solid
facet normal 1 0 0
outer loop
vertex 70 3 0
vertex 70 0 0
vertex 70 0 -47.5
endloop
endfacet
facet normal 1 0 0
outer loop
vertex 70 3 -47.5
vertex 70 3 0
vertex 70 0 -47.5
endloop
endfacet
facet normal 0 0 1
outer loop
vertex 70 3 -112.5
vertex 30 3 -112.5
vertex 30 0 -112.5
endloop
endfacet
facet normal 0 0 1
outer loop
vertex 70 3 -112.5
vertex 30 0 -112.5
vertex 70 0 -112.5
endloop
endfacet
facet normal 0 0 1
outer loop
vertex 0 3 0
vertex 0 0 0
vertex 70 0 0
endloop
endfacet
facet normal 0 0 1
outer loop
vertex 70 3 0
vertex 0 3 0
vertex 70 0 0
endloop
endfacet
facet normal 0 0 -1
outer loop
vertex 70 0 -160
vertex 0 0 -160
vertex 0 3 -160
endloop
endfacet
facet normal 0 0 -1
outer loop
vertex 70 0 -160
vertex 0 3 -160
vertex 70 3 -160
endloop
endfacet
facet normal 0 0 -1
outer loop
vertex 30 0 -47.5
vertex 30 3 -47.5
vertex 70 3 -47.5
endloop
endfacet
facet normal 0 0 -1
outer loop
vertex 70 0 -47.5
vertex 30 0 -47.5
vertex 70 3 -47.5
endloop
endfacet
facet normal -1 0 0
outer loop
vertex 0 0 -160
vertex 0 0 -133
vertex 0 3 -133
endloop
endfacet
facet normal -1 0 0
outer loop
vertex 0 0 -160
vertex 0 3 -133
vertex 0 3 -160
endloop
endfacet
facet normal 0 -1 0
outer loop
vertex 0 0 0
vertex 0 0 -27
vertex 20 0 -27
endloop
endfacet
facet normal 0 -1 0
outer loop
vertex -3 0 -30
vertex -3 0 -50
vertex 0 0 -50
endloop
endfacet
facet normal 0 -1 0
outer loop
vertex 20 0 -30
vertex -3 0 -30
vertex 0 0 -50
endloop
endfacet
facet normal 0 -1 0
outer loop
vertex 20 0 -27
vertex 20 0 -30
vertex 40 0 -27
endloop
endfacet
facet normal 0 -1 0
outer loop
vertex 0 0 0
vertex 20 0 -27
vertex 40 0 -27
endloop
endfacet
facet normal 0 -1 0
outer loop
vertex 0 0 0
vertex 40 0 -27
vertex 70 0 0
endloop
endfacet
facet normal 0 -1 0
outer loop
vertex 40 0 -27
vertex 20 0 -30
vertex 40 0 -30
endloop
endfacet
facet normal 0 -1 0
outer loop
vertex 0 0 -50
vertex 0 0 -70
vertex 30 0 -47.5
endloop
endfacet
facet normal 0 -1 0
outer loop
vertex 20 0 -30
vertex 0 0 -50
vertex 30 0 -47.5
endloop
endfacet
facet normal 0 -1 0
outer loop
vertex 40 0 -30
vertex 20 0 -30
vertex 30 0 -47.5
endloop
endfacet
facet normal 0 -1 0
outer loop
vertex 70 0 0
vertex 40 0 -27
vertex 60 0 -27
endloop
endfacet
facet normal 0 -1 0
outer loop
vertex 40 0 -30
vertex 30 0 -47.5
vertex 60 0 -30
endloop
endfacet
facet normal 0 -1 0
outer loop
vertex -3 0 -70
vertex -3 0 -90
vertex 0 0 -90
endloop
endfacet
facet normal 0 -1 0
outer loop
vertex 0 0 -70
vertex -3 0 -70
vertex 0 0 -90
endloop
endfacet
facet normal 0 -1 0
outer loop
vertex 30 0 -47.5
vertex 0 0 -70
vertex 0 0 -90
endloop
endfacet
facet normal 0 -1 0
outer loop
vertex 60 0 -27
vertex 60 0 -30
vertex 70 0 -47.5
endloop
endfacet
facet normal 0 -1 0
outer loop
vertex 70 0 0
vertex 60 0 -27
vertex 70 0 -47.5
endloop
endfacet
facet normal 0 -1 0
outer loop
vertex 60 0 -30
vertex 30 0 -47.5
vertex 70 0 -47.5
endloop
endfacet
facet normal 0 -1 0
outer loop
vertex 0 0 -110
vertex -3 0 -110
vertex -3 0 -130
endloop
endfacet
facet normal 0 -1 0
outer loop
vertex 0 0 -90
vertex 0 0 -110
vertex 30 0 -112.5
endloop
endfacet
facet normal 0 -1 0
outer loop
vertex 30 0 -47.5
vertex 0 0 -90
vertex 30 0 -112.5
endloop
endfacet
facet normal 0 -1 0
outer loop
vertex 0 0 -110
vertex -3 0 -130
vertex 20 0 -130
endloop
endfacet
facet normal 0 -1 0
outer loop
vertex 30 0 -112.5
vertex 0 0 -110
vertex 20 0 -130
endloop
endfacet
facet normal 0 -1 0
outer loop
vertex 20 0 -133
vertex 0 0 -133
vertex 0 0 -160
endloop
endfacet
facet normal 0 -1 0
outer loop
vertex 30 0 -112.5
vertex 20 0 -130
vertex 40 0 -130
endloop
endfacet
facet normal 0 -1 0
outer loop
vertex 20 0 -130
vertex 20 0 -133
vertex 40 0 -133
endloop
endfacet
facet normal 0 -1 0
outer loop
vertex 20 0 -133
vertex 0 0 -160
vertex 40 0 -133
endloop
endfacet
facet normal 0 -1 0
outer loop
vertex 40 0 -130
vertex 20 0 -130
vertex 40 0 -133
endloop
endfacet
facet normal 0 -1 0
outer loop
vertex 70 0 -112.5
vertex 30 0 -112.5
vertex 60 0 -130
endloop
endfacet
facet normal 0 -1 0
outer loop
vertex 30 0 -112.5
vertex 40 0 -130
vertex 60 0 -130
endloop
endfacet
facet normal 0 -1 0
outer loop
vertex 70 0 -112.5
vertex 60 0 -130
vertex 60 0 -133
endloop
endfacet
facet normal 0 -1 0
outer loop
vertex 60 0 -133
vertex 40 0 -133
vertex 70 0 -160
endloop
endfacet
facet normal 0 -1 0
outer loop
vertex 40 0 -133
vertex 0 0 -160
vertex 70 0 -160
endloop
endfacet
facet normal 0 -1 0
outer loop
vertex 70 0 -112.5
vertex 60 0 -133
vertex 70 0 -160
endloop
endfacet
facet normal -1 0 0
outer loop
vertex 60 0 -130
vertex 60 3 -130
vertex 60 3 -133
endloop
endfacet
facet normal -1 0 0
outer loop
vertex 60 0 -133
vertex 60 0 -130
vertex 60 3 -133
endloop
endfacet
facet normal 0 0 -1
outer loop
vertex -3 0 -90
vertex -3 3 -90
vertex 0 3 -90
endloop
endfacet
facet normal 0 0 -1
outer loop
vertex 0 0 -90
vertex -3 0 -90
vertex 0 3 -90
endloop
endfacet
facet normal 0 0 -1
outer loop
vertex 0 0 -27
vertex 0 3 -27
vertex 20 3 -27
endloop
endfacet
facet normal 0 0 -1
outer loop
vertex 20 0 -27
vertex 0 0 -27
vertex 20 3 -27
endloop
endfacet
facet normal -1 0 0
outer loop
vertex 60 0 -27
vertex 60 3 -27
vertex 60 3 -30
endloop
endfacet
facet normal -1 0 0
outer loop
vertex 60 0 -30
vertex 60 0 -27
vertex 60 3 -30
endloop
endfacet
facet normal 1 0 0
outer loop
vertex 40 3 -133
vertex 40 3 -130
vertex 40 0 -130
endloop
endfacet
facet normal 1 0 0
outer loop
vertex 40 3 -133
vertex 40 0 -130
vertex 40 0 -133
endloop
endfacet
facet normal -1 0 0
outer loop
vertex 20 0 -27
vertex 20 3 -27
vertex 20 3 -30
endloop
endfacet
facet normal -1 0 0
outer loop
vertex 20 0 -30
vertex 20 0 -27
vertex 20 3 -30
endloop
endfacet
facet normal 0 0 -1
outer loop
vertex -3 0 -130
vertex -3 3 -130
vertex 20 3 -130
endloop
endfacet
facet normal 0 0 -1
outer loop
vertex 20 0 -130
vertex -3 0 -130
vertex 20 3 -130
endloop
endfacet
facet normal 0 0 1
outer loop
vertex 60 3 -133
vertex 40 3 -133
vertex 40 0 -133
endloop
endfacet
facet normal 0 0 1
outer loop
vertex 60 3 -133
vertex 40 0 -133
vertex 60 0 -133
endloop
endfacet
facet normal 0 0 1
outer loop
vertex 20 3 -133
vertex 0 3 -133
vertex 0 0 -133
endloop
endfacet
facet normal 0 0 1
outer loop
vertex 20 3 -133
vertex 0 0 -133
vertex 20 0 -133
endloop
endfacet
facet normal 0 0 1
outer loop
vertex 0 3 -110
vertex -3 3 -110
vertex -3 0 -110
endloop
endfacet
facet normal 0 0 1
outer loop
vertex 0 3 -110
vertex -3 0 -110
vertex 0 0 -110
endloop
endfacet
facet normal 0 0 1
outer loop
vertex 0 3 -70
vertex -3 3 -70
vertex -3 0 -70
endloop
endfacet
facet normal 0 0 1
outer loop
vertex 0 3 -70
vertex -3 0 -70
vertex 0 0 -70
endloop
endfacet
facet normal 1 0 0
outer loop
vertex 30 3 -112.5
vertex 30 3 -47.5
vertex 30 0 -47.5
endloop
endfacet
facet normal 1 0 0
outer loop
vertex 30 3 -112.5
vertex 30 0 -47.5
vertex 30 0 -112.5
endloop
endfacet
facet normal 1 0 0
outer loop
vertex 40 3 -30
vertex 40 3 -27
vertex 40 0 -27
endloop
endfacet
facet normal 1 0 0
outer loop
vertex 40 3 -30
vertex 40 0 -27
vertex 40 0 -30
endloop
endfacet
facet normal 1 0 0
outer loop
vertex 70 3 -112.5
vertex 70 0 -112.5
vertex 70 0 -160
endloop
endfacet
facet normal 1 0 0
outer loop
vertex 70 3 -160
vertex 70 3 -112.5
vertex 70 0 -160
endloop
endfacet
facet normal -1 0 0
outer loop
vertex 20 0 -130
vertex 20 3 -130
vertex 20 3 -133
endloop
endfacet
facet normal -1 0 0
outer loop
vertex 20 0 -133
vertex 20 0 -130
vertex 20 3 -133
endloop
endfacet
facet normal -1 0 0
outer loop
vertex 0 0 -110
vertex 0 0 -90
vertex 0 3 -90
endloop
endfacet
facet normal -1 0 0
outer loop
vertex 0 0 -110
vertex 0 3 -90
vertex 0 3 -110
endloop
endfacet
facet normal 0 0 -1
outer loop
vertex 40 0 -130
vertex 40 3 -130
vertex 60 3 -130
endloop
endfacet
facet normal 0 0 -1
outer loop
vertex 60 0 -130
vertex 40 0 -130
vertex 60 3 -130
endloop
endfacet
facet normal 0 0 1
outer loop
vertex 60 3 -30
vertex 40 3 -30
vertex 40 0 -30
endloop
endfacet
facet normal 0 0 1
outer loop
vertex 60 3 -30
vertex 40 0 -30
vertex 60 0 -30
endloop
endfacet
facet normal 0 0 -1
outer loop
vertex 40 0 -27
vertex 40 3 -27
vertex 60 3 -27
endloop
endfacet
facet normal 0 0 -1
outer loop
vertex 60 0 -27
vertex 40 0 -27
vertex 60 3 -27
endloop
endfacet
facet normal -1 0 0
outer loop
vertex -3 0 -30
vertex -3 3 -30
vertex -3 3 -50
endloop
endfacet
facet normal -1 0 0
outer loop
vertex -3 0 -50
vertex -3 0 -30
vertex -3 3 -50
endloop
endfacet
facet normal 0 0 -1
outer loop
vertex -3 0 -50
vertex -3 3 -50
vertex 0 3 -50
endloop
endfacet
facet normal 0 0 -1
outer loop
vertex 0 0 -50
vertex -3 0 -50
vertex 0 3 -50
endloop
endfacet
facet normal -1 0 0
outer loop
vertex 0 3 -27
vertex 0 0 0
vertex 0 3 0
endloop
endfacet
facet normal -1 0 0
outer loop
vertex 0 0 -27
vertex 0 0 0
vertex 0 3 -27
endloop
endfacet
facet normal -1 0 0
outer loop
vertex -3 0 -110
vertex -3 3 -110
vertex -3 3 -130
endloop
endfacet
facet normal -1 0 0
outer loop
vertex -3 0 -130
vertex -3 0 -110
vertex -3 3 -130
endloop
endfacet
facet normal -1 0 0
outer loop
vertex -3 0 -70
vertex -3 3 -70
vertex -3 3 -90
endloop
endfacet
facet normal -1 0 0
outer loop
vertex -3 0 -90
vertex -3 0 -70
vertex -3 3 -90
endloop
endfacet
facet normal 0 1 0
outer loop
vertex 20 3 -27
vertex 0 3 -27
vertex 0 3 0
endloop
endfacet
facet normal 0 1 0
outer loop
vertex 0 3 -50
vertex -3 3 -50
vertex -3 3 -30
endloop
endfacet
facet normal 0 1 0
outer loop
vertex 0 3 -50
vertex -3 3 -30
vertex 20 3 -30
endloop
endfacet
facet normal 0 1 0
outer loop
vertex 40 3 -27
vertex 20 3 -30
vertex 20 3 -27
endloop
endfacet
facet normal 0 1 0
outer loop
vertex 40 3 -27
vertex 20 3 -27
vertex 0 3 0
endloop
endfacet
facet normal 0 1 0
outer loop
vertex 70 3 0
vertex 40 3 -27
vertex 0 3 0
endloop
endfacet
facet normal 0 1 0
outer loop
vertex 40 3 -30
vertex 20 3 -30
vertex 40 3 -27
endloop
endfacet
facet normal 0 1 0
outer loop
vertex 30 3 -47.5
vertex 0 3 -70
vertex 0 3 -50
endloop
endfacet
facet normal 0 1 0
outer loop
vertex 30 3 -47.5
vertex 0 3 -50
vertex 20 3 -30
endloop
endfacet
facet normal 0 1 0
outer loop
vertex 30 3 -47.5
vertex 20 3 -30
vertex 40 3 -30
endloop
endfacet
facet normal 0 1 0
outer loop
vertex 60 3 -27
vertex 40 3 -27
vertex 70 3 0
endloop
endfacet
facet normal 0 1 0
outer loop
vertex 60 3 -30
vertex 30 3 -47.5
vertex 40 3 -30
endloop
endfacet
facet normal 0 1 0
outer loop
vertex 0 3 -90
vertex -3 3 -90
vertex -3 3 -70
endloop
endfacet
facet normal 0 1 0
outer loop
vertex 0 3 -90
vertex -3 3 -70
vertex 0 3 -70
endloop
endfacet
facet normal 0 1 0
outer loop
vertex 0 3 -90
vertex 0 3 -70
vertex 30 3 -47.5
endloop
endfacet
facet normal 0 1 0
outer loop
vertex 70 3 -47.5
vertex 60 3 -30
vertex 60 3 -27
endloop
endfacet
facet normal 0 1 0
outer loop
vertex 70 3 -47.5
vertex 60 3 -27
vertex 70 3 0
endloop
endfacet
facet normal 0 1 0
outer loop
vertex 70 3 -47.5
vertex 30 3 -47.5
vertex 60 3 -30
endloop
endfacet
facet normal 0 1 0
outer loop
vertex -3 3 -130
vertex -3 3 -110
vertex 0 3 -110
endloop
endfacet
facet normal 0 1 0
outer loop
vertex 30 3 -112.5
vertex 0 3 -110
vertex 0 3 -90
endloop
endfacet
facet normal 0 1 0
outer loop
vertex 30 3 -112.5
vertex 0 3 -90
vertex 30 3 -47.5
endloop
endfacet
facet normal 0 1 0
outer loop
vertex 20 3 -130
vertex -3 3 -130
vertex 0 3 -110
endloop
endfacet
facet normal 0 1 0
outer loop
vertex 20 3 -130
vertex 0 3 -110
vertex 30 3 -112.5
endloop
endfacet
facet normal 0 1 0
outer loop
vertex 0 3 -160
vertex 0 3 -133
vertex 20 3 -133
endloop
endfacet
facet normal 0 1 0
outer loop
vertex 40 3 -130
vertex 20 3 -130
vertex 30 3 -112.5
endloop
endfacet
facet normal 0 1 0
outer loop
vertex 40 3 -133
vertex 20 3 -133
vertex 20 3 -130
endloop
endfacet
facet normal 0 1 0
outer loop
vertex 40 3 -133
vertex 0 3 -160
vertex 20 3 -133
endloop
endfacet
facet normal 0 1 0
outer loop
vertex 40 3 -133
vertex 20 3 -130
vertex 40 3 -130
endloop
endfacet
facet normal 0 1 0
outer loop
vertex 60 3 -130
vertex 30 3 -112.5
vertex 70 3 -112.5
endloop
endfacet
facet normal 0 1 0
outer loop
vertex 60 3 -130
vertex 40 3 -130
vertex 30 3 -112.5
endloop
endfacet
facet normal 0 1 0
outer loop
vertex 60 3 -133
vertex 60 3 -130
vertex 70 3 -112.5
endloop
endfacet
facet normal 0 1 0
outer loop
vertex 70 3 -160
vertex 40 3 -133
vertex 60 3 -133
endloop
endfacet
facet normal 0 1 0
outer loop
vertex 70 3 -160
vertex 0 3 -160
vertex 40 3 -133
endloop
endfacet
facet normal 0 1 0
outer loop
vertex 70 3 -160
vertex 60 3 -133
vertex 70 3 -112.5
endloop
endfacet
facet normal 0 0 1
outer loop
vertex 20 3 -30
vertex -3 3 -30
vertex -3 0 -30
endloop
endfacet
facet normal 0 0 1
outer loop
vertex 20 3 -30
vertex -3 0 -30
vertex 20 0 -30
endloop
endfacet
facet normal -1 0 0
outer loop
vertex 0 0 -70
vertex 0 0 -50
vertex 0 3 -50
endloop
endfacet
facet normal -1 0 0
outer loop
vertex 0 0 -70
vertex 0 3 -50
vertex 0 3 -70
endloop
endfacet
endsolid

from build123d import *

# Parameters (mm, degrees)
SKETCH1_W           = 70
SKETCH1_H           = 160
BOSS_EXTRUDE1_DEPTH = 3
SKETCH2_W           = 20
SKETCH2_H           = 3
CUT_EXTRUDE1_DEPTH  = 3
SKETCH3_W           = 3
SKETCH3_H           = 20
BOSS_EXTRUDE2_DEPTH = 3
SKETCH5_W           = 40
SKETCH5_H           = 65
CUT_EXTRUDE2_DEPTH  = 25


with BuildPart() as part:
    # Sketch1 → Boss-Extrude1 (new body)
    with BuildSketch(Plane(origin=(0, 0, 0), x_dir=(1, 0, 0), z_dir=(0, 1, 0))):
        with Locations((35, 80)):
            Rectangle(SKETCH1_W, SKETCH1_H)
    extrude(amount=BOSS_EXTRUDE1_DEPTH)

    # Sketch2 → Cut-Extrude1 (cut)
    with BuildSketch(Plane(origin=(0, 3, 0), x_dir=(1, 0, 0), z_dir=(0, 1, 0))):
        with Locations((10, 28.5)):
            Rectangle(SKETCH2_W, SKETCH2_H)
        with Locations((10, 131.5)):
            Rectangle(SKETCH2_W, SKETCH2_H)
        with Locations((50, 131.5)):
            Rectangle(SKETCH2_W, SKETCH2_H)
        with Locations((50, 28.5)):
            Rectangle(SKETCH2_W, SKETCH2_H)
    extrude(amount=-CUT_EXTRUDE1_DEPTH, mode=Mode.SUBTRACT)

    # Sketch3 → Boss-Extrude2 (add)
    with BuildSketch(Plane(origin=(0, 3, 0), x_dir=(1, 0, 0), z_dir=(0, 1, 0))):
        with Locations((-1.5, 120)):
            Rectangle(SKETCH3_W, SKETCH3_H)
        with Locations((-1.5, 80)):
            Rectangle(SKETCH3_W, SKETCH3_H)
        with Locations((-1.5, 40)):
            Rectangle(SKETCH3_W, SKETCH3_H)
    extrude(amount=-BOSS_EXTRUDE2_DEPTH)

    # Sketch5 → Cut-Extrude2 (cut)
    with BuildSketch(Plane(origin=(0, 3, 0), x_dir=(1, 0, 0), z_dir=(0, 1, 0))):
        with Locations((50, 80)):
            Rectangle(SKETCH5_W, SKETCH5_H)
    extrude(amount=-CUT_EXTRUDE2_DEPTH, mode=Mode.SUBTRACT)


solid = part.part
